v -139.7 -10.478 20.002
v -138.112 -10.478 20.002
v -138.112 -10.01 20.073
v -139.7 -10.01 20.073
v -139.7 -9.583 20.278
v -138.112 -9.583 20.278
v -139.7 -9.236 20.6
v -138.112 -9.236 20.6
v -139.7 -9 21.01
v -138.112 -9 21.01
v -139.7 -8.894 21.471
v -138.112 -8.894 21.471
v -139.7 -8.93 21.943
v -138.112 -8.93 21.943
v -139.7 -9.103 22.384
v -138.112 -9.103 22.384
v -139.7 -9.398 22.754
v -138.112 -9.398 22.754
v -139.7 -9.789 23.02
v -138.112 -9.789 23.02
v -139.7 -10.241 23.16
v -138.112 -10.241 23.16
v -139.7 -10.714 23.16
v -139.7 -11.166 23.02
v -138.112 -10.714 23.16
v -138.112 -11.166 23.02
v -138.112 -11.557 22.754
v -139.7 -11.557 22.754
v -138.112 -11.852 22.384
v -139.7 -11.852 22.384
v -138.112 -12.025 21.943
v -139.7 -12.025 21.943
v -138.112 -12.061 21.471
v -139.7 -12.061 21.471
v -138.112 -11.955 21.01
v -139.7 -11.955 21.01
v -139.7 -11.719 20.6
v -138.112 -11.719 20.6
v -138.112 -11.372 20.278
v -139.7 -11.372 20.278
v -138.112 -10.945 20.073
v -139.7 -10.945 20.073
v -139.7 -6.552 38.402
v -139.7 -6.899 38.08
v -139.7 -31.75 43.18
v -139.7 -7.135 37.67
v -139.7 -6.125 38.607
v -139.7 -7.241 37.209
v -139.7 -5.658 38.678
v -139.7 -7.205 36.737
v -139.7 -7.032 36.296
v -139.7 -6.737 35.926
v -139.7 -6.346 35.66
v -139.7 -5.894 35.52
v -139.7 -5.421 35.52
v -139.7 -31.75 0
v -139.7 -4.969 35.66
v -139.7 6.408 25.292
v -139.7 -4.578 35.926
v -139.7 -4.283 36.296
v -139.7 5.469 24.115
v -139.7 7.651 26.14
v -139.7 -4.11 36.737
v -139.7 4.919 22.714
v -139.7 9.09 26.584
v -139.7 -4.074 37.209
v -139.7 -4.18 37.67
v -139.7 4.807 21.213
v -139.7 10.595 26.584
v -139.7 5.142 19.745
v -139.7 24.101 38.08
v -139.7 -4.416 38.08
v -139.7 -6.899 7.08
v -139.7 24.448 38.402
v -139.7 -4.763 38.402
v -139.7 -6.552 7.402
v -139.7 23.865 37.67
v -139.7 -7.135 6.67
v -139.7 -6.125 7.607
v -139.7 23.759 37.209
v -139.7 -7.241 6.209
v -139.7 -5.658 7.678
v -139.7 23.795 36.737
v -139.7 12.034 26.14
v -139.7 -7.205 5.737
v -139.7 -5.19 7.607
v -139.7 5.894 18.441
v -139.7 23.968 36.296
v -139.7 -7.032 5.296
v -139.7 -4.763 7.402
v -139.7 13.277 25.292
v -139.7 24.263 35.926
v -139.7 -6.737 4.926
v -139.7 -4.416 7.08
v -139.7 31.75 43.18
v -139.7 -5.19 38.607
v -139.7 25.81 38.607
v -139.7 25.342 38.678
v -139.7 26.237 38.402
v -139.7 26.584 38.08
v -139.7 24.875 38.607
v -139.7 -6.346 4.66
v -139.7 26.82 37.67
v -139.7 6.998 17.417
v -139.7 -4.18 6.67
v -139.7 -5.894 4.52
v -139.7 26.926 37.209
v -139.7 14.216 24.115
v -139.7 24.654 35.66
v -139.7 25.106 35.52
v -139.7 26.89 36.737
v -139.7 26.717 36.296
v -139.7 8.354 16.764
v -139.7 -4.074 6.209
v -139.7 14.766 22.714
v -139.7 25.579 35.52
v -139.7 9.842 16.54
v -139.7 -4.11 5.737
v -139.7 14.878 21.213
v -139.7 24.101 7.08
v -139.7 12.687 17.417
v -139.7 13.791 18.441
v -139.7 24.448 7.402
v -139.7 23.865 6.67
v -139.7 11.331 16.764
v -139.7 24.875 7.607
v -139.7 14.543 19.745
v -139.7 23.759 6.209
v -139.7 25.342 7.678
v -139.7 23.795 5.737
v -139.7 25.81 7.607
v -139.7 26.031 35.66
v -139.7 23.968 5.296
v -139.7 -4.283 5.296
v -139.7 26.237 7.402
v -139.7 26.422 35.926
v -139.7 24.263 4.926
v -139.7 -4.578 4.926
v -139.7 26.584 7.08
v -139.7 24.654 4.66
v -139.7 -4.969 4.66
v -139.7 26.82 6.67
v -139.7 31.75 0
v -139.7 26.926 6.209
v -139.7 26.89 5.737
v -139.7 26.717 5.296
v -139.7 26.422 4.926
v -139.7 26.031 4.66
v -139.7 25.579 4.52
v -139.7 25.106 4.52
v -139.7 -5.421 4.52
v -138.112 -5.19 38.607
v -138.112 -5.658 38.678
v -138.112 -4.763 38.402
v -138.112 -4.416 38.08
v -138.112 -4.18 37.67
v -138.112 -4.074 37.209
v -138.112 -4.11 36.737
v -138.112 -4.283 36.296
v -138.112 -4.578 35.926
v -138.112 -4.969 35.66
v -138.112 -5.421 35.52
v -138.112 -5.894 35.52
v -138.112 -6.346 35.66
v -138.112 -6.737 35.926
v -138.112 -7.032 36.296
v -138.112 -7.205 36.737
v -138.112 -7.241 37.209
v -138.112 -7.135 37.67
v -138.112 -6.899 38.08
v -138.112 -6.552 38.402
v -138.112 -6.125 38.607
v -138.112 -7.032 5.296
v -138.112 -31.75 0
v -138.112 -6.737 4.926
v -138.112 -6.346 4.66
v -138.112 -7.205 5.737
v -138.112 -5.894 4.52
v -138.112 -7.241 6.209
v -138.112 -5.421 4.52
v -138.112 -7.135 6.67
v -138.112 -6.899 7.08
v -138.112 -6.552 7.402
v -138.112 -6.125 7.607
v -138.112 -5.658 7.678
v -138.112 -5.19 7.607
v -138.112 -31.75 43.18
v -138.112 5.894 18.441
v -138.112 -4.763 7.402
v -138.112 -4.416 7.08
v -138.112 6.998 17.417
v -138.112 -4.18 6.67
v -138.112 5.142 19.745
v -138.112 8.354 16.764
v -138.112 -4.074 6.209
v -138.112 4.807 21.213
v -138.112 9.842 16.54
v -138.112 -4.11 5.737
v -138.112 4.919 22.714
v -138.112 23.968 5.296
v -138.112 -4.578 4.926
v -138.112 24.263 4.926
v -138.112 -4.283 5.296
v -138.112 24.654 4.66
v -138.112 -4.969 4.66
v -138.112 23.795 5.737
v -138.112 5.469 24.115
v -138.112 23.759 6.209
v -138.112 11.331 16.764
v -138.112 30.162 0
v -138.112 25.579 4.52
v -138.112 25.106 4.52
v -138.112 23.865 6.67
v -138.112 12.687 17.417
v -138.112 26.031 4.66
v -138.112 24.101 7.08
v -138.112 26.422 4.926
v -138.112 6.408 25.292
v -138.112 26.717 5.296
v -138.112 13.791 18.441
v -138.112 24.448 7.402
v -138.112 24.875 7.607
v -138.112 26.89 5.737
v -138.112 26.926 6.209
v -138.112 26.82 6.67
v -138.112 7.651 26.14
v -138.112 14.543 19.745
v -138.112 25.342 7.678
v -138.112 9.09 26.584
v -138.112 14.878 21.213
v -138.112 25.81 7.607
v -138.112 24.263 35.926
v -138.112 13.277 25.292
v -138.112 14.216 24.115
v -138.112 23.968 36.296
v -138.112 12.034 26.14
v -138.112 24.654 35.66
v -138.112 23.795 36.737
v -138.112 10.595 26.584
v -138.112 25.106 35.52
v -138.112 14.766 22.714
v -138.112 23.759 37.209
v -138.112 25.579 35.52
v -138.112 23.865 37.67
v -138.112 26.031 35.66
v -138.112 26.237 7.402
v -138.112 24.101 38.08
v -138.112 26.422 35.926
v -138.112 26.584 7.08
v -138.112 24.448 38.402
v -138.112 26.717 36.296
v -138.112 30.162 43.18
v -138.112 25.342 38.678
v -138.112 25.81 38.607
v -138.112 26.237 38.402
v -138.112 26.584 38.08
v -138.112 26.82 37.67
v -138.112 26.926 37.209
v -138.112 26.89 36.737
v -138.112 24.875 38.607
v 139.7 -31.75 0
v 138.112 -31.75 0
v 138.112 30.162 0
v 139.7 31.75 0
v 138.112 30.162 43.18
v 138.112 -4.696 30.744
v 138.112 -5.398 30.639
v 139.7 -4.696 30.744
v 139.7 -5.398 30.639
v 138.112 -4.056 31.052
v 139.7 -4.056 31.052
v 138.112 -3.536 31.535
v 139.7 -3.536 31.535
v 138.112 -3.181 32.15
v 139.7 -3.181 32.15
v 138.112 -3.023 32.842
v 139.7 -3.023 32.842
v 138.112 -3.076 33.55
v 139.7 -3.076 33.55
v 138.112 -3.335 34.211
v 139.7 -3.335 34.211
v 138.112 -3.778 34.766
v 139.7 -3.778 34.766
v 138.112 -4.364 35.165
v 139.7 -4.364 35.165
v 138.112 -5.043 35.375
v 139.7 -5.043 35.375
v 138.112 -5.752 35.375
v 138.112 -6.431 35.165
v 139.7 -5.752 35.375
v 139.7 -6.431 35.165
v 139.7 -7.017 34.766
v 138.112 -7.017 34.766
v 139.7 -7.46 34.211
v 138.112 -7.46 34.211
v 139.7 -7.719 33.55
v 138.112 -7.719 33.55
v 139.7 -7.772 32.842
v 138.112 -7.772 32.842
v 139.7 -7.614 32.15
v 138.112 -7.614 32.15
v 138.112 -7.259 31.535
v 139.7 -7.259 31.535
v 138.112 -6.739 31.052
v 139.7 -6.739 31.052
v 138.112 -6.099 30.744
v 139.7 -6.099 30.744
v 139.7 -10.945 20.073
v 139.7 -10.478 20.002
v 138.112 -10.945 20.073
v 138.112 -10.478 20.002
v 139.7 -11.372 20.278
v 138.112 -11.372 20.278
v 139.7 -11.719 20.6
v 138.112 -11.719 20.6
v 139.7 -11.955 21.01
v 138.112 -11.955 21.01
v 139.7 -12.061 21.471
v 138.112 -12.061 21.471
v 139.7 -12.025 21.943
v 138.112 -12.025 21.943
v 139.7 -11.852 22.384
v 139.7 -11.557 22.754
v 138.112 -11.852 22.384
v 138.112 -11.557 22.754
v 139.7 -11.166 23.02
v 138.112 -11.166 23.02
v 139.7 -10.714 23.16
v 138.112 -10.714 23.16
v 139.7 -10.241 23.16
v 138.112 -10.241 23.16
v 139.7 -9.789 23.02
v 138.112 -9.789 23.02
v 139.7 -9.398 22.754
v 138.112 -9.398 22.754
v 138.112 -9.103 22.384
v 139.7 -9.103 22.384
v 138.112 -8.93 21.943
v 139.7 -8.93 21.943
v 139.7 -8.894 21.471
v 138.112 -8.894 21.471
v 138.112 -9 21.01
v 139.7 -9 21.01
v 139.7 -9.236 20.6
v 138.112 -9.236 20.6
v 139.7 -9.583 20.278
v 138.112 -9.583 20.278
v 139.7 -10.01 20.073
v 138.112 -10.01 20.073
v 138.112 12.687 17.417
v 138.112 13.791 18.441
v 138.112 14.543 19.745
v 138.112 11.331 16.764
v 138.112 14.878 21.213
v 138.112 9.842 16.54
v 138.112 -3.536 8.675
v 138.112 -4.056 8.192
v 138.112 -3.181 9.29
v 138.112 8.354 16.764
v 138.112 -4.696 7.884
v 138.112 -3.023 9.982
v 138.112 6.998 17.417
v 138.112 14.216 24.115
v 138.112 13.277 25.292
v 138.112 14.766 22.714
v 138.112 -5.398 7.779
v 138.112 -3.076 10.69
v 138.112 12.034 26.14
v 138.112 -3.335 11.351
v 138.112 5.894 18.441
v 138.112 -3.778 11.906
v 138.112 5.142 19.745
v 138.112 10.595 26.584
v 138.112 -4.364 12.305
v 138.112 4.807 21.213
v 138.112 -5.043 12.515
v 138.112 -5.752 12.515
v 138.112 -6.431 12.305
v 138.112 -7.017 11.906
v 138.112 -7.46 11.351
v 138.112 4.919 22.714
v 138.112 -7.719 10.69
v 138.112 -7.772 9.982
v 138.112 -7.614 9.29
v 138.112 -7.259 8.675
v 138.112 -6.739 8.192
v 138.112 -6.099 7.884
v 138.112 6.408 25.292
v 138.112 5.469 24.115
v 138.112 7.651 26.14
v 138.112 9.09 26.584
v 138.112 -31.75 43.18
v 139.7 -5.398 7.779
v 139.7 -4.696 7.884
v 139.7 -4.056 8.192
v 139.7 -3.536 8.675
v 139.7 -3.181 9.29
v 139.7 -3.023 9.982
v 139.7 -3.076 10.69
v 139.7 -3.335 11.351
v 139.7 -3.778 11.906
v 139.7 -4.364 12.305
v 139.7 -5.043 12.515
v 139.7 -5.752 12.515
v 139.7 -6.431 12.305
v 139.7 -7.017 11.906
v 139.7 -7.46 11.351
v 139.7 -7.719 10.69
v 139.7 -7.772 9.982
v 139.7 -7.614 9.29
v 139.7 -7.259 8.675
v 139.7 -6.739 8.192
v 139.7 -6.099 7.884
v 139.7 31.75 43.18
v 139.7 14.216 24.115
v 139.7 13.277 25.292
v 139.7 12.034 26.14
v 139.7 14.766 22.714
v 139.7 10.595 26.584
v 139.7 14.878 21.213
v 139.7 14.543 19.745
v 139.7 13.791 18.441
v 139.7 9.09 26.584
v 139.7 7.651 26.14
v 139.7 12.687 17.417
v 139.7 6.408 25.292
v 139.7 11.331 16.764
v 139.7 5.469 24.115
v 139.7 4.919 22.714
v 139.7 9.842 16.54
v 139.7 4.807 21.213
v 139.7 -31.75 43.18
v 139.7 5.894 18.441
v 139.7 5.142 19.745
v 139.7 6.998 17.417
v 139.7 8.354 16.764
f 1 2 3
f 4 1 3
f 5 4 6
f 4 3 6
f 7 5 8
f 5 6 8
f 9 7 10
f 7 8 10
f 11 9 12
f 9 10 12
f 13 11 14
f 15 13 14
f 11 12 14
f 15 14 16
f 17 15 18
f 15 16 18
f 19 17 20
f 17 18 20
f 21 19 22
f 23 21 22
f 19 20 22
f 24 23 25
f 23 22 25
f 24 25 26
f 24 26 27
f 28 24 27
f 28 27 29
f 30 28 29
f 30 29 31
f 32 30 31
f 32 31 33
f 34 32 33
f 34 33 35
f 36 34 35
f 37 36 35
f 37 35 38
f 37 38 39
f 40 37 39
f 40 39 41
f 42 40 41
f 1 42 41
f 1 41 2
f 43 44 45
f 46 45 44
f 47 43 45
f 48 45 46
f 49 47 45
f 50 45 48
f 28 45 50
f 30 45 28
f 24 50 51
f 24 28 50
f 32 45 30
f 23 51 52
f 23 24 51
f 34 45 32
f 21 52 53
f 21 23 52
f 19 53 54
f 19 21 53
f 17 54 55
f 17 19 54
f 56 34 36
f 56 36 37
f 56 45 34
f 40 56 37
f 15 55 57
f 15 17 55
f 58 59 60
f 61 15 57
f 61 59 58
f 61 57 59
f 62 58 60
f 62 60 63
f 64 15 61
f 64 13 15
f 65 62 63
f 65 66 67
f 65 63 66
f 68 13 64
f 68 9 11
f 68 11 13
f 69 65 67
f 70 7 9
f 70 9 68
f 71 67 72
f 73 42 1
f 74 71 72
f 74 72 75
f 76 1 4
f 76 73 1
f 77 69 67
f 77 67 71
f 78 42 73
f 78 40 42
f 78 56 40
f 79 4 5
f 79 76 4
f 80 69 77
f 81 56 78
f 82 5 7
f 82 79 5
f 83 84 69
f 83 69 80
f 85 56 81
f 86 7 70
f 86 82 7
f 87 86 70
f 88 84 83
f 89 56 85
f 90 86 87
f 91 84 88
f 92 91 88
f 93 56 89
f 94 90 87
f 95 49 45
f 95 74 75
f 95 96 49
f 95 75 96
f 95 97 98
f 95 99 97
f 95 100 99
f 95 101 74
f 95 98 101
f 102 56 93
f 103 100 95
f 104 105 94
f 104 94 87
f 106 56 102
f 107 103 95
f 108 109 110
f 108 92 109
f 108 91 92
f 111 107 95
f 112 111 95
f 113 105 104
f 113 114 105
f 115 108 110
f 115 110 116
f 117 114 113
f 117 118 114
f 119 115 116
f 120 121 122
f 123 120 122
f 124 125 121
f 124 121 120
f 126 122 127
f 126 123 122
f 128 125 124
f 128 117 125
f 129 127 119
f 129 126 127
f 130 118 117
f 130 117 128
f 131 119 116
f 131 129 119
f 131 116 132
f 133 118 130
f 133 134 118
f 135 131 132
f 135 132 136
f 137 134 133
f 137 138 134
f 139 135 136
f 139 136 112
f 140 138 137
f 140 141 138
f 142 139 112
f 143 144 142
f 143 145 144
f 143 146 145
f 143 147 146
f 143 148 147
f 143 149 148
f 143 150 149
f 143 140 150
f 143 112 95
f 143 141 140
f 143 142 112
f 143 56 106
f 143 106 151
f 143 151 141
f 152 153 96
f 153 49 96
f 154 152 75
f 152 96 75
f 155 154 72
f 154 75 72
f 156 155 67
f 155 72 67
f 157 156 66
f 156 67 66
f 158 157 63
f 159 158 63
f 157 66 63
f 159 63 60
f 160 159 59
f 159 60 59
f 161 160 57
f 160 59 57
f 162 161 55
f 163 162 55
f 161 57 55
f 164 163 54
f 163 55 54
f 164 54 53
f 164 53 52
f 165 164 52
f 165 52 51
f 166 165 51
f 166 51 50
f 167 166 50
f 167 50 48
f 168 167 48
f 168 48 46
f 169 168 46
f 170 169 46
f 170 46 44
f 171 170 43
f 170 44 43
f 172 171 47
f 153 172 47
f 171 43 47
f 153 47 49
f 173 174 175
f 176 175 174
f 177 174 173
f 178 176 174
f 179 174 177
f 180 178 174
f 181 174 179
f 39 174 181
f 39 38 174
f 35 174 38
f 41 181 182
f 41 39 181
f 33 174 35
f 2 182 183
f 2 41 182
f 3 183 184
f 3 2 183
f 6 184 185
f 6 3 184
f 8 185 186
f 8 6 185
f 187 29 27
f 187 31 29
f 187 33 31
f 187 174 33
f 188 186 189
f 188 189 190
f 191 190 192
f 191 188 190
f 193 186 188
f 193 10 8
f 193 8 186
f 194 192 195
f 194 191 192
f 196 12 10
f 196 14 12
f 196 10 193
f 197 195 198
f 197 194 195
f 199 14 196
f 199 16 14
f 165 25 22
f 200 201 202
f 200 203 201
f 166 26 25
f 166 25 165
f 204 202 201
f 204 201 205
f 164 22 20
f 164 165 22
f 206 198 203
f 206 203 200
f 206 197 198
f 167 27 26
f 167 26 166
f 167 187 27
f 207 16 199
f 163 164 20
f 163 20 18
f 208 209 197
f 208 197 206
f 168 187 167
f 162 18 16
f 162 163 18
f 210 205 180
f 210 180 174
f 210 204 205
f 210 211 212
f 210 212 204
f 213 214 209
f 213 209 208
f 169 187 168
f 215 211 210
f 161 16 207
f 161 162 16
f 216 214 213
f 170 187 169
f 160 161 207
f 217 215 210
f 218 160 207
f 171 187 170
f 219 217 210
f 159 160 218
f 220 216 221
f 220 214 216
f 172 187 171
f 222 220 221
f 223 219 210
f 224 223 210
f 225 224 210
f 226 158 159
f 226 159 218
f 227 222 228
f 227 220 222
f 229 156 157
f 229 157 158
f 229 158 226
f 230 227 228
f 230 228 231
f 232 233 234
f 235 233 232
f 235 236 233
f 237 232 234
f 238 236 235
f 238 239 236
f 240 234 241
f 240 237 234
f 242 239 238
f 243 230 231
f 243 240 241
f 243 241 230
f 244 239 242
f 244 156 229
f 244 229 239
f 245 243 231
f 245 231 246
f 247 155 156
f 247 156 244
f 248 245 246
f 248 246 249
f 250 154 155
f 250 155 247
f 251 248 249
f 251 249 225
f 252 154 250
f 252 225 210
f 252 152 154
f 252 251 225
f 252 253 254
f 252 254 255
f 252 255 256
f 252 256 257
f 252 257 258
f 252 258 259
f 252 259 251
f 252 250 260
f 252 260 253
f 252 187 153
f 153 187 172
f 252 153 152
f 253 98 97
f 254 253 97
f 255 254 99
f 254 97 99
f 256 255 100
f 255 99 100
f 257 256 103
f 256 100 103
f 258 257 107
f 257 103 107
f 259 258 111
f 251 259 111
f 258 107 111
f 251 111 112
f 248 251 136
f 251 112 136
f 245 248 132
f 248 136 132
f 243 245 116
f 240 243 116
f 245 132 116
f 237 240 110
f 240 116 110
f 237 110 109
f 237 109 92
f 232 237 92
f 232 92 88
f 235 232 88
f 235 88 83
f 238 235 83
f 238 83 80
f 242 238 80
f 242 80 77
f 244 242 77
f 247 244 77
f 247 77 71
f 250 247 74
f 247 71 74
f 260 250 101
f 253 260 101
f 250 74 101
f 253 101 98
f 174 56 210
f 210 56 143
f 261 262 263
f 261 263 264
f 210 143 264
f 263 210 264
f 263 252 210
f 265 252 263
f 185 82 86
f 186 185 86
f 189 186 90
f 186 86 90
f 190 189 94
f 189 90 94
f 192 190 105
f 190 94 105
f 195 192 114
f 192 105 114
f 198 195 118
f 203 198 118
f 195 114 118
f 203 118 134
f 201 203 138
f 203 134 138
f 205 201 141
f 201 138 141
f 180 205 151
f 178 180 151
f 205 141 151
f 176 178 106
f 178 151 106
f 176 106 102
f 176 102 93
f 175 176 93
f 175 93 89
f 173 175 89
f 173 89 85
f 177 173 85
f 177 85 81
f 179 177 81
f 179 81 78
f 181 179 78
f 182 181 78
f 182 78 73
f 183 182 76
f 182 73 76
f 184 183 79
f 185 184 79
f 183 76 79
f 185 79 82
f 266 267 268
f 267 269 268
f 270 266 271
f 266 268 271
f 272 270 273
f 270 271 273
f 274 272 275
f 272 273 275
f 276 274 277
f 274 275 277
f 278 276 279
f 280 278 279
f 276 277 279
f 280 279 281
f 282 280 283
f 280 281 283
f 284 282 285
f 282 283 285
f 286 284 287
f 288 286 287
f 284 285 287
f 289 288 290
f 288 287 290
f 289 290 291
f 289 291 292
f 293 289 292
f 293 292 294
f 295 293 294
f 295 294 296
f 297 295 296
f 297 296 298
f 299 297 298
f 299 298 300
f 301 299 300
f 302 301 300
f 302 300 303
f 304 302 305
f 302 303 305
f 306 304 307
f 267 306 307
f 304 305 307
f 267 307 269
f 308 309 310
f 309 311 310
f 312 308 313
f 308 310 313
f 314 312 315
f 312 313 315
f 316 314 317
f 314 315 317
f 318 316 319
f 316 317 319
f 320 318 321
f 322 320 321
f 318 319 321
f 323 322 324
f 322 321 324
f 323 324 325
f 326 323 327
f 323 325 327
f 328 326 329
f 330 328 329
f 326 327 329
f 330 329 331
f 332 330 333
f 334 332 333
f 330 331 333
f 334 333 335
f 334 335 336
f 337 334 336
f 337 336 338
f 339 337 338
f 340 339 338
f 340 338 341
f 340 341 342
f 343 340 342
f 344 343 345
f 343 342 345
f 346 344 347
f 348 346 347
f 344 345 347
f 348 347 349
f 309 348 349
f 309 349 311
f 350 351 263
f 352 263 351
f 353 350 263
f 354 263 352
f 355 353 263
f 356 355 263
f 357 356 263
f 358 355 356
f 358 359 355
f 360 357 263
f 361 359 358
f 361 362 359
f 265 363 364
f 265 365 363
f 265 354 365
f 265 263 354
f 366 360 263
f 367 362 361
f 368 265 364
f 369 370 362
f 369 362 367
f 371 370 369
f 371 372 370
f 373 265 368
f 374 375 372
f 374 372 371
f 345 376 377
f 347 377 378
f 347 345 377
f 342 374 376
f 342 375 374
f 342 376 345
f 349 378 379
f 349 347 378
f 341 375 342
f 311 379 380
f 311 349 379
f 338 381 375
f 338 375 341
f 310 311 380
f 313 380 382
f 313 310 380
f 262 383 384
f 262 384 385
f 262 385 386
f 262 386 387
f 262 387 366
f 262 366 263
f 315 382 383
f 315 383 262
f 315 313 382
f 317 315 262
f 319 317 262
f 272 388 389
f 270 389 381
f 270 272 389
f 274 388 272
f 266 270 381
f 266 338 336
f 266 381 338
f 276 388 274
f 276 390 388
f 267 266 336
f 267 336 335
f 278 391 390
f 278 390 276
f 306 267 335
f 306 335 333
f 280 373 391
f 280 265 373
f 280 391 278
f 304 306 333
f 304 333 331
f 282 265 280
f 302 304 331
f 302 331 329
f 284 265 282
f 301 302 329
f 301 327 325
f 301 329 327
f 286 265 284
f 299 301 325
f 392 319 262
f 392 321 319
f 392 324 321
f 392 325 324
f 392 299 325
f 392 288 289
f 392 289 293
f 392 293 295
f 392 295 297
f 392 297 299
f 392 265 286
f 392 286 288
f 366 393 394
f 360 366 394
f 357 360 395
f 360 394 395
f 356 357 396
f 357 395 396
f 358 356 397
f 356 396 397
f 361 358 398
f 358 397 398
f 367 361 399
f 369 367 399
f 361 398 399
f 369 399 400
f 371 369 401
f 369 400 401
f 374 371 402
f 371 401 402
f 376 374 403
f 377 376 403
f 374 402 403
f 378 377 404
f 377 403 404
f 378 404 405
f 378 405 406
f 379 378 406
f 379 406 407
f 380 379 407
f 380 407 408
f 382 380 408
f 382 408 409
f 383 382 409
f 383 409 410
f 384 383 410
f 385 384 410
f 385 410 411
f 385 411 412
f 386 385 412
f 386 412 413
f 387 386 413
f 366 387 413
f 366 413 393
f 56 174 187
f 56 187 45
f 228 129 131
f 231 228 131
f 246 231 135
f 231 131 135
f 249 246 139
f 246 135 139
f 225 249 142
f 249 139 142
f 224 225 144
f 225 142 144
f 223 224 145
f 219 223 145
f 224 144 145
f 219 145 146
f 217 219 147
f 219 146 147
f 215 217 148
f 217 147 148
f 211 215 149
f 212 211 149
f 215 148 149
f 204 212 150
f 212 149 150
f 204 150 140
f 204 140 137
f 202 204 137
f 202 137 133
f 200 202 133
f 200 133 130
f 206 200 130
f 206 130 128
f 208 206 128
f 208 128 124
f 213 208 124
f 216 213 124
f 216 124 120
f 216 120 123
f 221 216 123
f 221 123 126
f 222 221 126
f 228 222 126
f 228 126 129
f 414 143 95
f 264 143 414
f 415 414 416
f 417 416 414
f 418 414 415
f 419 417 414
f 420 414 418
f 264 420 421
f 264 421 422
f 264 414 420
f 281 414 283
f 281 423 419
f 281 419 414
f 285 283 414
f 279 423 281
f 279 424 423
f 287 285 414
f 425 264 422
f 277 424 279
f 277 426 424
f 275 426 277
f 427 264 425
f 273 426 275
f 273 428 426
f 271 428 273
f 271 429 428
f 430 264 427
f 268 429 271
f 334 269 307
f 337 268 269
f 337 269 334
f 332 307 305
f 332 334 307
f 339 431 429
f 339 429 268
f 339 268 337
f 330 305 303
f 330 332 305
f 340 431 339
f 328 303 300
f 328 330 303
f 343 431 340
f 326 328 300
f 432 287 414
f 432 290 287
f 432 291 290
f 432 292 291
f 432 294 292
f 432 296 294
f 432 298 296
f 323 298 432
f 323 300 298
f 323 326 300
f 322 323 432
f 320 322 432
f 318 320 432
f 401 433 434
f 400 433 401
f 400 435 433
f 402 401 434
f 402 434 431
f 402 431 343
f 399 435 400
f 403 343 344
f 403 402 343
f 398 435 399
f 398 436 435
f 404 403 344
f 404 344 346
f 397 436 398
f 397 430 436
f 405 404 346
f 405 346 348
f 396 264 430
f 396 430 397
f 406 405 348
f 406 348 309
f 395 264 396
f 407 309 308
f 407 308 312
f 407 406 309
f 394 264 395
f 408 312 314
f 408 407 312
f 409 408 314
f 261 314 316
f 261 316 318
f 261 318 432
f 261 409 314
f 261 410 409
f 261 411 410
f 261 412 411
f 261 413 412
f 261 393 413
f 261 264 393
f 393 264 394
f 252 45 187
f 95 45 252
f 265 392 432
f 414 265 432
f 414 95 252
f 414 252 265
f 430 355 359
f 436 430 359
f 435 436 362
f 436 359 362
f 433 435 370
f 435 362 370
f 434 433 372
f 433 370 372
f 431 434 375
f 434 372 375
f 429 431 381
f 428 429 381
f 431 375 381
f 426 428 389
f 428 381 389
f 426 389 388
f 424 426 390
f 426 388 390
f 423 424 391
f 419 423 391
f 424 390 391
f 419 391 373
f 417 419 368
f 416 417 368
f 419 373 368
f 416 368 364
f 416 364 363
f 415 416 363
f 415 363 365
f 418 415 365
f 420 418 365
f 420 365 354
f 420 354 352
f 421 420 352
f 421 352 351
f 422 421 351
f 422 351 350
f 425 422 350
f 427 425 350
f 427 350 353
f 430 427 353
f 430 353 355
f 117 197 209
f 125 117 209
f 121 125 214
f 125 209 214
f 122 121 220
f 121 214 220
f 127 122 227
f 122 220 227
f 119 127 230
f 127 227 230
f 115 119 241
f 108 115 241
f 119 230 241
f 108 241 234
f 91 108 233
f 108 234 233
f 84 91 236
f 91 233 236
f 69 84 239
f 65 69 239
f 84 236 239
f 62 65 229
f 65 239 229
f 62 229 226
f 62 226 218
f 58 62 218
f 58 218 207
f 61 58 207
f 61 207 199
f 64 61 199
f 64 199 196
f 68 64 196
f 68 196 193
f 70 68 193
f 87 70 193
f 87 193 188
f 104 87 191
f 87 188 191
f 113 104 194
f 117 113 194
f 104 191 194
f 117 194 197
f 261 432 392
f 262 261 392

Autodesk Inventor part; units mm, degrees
ref_plane "YZ Plane" through (0, 0, 0) normal (1, 0, 0) x (0, 1, 0)
ref_plane "XZ Plane" through (0, 0, 0) normal (0, 1, 0) x (-1, 0, 0)
ref_plane "XY Plane" through (0, 0, 0) normal (0, 0, 1) x (1, 0, 0)
sketch "Sketch1" plane through (0, 0, 0) normal (0, 0, 1) x (1, 0, 0)
  line L0 (-139.7, 31.75) -> (139.7, 31.75)
  line L1 (139.7, 31.75) -> (139.7, -31.75)
  line L2 (139.7, -31.75) -> (-139.7, -31.75)
  line L3 (-139.7, -31.75) -> (-139.7, 31.75)
  point P0 (0, 0)
  point P1 (0, 31.75)
  point P2 (139.7, 0)
  dimension "d0" = 279.4
  dimension "d1" = 63.5
extrude "Extrusion1" add sketch "Sketch1" along normal blind 43.18
sketch "Sketch2" plane through (0, 0, 43.18) normal (0, 0, 1) x (1, 0, 0)
  line L0 (-139.7, -31.75) -> (139.7, -31.75) projected
  line L1 (-138.1125, 30.1625) -> (138.1125, 30.1625)
  line L2 (138.1125, 30.1625) -> (138.1125, -31.75)
  line L3 (138.1125, -31.75) -> (-138.1125, -31.75)
  line L4 (-138.1125, -31.75) -> (-138.1125, 30.1625)
  line L5 (139.7, -31.75) -> (139.7, 31.75) projected
  line L6 (139.7, 31.75) -> (-139.7, 31.75) projected
  line L7 (-139.7, 31.75) -> (-139.7, -31.75) projected
  point P0 (0, 0)
  point P1 (-138.1125, -31.75)
  dimension "d4" = 1.5875
  dimension "d5" = 1.5875
  dimension "d6" = 1.5875
extrude "Extrusion2" cut sketch "Sketch2" against normal up to surface (43.18 mm away) contours L4 L1 L2 L0
sketch "Sketch3" plane through (-138.1125, -31.75, 43.18) normal (1, 0, 0) x (0, 0, -1)
  circle A0 centre (21.59, 41.5925) radius 5.05
  line L0 (0, 61.9125) -> (43.18, 61.9125) projected
  circle A1 centre (21.59, 21.2725) radius 1.5875
  line L1 (43.18, 63.5) -> (0, 63.5) projected
  point P0 (43.18, 31.75)
  point P1 (21.59, 63.5)
  dimension "d9" = 10.1
  dimension "d10" = 20.32
  dimension "d13" = 3.175
  dimension "d15" = 20.32
extrude "Extrusion3" cut sketch "Sketch3" along normal through all both and the other way through all
sketch "Sketch4" plane through (139.7, -31.75, 0) normal (1, 0, 0) x (0, 0, -1)
  circle A0 centre (-10.16, 26.3525) radius 2.3813
  line L0 (0, 63.5) -> (-43.18, 63.5) construction
  line L1 (-21.59, 63.5) -> (-21.59, -3.1611) construction
  line L2 (0, 0) -> (0, 63.5) projected
  circle A1 centre (-21.59, 41.5925) radius 5.05 projected
  circle A2 centre (-33.02, 26.3525) radius 2.3813
  point P0 (0, 31.75)
  dimension "d16" = 10.16
  dimension "d17" = 15.24
  dimension "d18" = 4.7625
extrude "Extrusion4" cut sketch "Sketch4" against normal up to surface (1.5875 mm away) contours A0 | A2
sketch "Sketch5" plane through (-139.7, -31.75, 0) normal (-1, 0, 0) x (0, 0, 1)
  circle A0 centre (21.59, 41.5925) radius 5.05 construction
  line L0 (21.59, 41.5925) -> (21.59, 66.4825) construction
  line L1 (21.59, 41.5925) -> (51.2225, 41.5925) construction
  circle A1 centre (37.09, 57.0925) radius 1.5875
  circle A2 centre (6.09, 57.0925) radius 1.5875
  circle A3 centre (37.09, 26.0925) radius 1.5875
  circle A4 centre (6.09, 26.0925) radius 1.5875
  point P0 (0, 31.75)
  dimension "d21" = 3.175
  dimension "d22" = 15.5
  dimension "d23" = 15.5
extrude "Extrusion5" cut sketch "Sketch5" against normal up to surface (1.5875 mm away)
properties part number "Bracket"
